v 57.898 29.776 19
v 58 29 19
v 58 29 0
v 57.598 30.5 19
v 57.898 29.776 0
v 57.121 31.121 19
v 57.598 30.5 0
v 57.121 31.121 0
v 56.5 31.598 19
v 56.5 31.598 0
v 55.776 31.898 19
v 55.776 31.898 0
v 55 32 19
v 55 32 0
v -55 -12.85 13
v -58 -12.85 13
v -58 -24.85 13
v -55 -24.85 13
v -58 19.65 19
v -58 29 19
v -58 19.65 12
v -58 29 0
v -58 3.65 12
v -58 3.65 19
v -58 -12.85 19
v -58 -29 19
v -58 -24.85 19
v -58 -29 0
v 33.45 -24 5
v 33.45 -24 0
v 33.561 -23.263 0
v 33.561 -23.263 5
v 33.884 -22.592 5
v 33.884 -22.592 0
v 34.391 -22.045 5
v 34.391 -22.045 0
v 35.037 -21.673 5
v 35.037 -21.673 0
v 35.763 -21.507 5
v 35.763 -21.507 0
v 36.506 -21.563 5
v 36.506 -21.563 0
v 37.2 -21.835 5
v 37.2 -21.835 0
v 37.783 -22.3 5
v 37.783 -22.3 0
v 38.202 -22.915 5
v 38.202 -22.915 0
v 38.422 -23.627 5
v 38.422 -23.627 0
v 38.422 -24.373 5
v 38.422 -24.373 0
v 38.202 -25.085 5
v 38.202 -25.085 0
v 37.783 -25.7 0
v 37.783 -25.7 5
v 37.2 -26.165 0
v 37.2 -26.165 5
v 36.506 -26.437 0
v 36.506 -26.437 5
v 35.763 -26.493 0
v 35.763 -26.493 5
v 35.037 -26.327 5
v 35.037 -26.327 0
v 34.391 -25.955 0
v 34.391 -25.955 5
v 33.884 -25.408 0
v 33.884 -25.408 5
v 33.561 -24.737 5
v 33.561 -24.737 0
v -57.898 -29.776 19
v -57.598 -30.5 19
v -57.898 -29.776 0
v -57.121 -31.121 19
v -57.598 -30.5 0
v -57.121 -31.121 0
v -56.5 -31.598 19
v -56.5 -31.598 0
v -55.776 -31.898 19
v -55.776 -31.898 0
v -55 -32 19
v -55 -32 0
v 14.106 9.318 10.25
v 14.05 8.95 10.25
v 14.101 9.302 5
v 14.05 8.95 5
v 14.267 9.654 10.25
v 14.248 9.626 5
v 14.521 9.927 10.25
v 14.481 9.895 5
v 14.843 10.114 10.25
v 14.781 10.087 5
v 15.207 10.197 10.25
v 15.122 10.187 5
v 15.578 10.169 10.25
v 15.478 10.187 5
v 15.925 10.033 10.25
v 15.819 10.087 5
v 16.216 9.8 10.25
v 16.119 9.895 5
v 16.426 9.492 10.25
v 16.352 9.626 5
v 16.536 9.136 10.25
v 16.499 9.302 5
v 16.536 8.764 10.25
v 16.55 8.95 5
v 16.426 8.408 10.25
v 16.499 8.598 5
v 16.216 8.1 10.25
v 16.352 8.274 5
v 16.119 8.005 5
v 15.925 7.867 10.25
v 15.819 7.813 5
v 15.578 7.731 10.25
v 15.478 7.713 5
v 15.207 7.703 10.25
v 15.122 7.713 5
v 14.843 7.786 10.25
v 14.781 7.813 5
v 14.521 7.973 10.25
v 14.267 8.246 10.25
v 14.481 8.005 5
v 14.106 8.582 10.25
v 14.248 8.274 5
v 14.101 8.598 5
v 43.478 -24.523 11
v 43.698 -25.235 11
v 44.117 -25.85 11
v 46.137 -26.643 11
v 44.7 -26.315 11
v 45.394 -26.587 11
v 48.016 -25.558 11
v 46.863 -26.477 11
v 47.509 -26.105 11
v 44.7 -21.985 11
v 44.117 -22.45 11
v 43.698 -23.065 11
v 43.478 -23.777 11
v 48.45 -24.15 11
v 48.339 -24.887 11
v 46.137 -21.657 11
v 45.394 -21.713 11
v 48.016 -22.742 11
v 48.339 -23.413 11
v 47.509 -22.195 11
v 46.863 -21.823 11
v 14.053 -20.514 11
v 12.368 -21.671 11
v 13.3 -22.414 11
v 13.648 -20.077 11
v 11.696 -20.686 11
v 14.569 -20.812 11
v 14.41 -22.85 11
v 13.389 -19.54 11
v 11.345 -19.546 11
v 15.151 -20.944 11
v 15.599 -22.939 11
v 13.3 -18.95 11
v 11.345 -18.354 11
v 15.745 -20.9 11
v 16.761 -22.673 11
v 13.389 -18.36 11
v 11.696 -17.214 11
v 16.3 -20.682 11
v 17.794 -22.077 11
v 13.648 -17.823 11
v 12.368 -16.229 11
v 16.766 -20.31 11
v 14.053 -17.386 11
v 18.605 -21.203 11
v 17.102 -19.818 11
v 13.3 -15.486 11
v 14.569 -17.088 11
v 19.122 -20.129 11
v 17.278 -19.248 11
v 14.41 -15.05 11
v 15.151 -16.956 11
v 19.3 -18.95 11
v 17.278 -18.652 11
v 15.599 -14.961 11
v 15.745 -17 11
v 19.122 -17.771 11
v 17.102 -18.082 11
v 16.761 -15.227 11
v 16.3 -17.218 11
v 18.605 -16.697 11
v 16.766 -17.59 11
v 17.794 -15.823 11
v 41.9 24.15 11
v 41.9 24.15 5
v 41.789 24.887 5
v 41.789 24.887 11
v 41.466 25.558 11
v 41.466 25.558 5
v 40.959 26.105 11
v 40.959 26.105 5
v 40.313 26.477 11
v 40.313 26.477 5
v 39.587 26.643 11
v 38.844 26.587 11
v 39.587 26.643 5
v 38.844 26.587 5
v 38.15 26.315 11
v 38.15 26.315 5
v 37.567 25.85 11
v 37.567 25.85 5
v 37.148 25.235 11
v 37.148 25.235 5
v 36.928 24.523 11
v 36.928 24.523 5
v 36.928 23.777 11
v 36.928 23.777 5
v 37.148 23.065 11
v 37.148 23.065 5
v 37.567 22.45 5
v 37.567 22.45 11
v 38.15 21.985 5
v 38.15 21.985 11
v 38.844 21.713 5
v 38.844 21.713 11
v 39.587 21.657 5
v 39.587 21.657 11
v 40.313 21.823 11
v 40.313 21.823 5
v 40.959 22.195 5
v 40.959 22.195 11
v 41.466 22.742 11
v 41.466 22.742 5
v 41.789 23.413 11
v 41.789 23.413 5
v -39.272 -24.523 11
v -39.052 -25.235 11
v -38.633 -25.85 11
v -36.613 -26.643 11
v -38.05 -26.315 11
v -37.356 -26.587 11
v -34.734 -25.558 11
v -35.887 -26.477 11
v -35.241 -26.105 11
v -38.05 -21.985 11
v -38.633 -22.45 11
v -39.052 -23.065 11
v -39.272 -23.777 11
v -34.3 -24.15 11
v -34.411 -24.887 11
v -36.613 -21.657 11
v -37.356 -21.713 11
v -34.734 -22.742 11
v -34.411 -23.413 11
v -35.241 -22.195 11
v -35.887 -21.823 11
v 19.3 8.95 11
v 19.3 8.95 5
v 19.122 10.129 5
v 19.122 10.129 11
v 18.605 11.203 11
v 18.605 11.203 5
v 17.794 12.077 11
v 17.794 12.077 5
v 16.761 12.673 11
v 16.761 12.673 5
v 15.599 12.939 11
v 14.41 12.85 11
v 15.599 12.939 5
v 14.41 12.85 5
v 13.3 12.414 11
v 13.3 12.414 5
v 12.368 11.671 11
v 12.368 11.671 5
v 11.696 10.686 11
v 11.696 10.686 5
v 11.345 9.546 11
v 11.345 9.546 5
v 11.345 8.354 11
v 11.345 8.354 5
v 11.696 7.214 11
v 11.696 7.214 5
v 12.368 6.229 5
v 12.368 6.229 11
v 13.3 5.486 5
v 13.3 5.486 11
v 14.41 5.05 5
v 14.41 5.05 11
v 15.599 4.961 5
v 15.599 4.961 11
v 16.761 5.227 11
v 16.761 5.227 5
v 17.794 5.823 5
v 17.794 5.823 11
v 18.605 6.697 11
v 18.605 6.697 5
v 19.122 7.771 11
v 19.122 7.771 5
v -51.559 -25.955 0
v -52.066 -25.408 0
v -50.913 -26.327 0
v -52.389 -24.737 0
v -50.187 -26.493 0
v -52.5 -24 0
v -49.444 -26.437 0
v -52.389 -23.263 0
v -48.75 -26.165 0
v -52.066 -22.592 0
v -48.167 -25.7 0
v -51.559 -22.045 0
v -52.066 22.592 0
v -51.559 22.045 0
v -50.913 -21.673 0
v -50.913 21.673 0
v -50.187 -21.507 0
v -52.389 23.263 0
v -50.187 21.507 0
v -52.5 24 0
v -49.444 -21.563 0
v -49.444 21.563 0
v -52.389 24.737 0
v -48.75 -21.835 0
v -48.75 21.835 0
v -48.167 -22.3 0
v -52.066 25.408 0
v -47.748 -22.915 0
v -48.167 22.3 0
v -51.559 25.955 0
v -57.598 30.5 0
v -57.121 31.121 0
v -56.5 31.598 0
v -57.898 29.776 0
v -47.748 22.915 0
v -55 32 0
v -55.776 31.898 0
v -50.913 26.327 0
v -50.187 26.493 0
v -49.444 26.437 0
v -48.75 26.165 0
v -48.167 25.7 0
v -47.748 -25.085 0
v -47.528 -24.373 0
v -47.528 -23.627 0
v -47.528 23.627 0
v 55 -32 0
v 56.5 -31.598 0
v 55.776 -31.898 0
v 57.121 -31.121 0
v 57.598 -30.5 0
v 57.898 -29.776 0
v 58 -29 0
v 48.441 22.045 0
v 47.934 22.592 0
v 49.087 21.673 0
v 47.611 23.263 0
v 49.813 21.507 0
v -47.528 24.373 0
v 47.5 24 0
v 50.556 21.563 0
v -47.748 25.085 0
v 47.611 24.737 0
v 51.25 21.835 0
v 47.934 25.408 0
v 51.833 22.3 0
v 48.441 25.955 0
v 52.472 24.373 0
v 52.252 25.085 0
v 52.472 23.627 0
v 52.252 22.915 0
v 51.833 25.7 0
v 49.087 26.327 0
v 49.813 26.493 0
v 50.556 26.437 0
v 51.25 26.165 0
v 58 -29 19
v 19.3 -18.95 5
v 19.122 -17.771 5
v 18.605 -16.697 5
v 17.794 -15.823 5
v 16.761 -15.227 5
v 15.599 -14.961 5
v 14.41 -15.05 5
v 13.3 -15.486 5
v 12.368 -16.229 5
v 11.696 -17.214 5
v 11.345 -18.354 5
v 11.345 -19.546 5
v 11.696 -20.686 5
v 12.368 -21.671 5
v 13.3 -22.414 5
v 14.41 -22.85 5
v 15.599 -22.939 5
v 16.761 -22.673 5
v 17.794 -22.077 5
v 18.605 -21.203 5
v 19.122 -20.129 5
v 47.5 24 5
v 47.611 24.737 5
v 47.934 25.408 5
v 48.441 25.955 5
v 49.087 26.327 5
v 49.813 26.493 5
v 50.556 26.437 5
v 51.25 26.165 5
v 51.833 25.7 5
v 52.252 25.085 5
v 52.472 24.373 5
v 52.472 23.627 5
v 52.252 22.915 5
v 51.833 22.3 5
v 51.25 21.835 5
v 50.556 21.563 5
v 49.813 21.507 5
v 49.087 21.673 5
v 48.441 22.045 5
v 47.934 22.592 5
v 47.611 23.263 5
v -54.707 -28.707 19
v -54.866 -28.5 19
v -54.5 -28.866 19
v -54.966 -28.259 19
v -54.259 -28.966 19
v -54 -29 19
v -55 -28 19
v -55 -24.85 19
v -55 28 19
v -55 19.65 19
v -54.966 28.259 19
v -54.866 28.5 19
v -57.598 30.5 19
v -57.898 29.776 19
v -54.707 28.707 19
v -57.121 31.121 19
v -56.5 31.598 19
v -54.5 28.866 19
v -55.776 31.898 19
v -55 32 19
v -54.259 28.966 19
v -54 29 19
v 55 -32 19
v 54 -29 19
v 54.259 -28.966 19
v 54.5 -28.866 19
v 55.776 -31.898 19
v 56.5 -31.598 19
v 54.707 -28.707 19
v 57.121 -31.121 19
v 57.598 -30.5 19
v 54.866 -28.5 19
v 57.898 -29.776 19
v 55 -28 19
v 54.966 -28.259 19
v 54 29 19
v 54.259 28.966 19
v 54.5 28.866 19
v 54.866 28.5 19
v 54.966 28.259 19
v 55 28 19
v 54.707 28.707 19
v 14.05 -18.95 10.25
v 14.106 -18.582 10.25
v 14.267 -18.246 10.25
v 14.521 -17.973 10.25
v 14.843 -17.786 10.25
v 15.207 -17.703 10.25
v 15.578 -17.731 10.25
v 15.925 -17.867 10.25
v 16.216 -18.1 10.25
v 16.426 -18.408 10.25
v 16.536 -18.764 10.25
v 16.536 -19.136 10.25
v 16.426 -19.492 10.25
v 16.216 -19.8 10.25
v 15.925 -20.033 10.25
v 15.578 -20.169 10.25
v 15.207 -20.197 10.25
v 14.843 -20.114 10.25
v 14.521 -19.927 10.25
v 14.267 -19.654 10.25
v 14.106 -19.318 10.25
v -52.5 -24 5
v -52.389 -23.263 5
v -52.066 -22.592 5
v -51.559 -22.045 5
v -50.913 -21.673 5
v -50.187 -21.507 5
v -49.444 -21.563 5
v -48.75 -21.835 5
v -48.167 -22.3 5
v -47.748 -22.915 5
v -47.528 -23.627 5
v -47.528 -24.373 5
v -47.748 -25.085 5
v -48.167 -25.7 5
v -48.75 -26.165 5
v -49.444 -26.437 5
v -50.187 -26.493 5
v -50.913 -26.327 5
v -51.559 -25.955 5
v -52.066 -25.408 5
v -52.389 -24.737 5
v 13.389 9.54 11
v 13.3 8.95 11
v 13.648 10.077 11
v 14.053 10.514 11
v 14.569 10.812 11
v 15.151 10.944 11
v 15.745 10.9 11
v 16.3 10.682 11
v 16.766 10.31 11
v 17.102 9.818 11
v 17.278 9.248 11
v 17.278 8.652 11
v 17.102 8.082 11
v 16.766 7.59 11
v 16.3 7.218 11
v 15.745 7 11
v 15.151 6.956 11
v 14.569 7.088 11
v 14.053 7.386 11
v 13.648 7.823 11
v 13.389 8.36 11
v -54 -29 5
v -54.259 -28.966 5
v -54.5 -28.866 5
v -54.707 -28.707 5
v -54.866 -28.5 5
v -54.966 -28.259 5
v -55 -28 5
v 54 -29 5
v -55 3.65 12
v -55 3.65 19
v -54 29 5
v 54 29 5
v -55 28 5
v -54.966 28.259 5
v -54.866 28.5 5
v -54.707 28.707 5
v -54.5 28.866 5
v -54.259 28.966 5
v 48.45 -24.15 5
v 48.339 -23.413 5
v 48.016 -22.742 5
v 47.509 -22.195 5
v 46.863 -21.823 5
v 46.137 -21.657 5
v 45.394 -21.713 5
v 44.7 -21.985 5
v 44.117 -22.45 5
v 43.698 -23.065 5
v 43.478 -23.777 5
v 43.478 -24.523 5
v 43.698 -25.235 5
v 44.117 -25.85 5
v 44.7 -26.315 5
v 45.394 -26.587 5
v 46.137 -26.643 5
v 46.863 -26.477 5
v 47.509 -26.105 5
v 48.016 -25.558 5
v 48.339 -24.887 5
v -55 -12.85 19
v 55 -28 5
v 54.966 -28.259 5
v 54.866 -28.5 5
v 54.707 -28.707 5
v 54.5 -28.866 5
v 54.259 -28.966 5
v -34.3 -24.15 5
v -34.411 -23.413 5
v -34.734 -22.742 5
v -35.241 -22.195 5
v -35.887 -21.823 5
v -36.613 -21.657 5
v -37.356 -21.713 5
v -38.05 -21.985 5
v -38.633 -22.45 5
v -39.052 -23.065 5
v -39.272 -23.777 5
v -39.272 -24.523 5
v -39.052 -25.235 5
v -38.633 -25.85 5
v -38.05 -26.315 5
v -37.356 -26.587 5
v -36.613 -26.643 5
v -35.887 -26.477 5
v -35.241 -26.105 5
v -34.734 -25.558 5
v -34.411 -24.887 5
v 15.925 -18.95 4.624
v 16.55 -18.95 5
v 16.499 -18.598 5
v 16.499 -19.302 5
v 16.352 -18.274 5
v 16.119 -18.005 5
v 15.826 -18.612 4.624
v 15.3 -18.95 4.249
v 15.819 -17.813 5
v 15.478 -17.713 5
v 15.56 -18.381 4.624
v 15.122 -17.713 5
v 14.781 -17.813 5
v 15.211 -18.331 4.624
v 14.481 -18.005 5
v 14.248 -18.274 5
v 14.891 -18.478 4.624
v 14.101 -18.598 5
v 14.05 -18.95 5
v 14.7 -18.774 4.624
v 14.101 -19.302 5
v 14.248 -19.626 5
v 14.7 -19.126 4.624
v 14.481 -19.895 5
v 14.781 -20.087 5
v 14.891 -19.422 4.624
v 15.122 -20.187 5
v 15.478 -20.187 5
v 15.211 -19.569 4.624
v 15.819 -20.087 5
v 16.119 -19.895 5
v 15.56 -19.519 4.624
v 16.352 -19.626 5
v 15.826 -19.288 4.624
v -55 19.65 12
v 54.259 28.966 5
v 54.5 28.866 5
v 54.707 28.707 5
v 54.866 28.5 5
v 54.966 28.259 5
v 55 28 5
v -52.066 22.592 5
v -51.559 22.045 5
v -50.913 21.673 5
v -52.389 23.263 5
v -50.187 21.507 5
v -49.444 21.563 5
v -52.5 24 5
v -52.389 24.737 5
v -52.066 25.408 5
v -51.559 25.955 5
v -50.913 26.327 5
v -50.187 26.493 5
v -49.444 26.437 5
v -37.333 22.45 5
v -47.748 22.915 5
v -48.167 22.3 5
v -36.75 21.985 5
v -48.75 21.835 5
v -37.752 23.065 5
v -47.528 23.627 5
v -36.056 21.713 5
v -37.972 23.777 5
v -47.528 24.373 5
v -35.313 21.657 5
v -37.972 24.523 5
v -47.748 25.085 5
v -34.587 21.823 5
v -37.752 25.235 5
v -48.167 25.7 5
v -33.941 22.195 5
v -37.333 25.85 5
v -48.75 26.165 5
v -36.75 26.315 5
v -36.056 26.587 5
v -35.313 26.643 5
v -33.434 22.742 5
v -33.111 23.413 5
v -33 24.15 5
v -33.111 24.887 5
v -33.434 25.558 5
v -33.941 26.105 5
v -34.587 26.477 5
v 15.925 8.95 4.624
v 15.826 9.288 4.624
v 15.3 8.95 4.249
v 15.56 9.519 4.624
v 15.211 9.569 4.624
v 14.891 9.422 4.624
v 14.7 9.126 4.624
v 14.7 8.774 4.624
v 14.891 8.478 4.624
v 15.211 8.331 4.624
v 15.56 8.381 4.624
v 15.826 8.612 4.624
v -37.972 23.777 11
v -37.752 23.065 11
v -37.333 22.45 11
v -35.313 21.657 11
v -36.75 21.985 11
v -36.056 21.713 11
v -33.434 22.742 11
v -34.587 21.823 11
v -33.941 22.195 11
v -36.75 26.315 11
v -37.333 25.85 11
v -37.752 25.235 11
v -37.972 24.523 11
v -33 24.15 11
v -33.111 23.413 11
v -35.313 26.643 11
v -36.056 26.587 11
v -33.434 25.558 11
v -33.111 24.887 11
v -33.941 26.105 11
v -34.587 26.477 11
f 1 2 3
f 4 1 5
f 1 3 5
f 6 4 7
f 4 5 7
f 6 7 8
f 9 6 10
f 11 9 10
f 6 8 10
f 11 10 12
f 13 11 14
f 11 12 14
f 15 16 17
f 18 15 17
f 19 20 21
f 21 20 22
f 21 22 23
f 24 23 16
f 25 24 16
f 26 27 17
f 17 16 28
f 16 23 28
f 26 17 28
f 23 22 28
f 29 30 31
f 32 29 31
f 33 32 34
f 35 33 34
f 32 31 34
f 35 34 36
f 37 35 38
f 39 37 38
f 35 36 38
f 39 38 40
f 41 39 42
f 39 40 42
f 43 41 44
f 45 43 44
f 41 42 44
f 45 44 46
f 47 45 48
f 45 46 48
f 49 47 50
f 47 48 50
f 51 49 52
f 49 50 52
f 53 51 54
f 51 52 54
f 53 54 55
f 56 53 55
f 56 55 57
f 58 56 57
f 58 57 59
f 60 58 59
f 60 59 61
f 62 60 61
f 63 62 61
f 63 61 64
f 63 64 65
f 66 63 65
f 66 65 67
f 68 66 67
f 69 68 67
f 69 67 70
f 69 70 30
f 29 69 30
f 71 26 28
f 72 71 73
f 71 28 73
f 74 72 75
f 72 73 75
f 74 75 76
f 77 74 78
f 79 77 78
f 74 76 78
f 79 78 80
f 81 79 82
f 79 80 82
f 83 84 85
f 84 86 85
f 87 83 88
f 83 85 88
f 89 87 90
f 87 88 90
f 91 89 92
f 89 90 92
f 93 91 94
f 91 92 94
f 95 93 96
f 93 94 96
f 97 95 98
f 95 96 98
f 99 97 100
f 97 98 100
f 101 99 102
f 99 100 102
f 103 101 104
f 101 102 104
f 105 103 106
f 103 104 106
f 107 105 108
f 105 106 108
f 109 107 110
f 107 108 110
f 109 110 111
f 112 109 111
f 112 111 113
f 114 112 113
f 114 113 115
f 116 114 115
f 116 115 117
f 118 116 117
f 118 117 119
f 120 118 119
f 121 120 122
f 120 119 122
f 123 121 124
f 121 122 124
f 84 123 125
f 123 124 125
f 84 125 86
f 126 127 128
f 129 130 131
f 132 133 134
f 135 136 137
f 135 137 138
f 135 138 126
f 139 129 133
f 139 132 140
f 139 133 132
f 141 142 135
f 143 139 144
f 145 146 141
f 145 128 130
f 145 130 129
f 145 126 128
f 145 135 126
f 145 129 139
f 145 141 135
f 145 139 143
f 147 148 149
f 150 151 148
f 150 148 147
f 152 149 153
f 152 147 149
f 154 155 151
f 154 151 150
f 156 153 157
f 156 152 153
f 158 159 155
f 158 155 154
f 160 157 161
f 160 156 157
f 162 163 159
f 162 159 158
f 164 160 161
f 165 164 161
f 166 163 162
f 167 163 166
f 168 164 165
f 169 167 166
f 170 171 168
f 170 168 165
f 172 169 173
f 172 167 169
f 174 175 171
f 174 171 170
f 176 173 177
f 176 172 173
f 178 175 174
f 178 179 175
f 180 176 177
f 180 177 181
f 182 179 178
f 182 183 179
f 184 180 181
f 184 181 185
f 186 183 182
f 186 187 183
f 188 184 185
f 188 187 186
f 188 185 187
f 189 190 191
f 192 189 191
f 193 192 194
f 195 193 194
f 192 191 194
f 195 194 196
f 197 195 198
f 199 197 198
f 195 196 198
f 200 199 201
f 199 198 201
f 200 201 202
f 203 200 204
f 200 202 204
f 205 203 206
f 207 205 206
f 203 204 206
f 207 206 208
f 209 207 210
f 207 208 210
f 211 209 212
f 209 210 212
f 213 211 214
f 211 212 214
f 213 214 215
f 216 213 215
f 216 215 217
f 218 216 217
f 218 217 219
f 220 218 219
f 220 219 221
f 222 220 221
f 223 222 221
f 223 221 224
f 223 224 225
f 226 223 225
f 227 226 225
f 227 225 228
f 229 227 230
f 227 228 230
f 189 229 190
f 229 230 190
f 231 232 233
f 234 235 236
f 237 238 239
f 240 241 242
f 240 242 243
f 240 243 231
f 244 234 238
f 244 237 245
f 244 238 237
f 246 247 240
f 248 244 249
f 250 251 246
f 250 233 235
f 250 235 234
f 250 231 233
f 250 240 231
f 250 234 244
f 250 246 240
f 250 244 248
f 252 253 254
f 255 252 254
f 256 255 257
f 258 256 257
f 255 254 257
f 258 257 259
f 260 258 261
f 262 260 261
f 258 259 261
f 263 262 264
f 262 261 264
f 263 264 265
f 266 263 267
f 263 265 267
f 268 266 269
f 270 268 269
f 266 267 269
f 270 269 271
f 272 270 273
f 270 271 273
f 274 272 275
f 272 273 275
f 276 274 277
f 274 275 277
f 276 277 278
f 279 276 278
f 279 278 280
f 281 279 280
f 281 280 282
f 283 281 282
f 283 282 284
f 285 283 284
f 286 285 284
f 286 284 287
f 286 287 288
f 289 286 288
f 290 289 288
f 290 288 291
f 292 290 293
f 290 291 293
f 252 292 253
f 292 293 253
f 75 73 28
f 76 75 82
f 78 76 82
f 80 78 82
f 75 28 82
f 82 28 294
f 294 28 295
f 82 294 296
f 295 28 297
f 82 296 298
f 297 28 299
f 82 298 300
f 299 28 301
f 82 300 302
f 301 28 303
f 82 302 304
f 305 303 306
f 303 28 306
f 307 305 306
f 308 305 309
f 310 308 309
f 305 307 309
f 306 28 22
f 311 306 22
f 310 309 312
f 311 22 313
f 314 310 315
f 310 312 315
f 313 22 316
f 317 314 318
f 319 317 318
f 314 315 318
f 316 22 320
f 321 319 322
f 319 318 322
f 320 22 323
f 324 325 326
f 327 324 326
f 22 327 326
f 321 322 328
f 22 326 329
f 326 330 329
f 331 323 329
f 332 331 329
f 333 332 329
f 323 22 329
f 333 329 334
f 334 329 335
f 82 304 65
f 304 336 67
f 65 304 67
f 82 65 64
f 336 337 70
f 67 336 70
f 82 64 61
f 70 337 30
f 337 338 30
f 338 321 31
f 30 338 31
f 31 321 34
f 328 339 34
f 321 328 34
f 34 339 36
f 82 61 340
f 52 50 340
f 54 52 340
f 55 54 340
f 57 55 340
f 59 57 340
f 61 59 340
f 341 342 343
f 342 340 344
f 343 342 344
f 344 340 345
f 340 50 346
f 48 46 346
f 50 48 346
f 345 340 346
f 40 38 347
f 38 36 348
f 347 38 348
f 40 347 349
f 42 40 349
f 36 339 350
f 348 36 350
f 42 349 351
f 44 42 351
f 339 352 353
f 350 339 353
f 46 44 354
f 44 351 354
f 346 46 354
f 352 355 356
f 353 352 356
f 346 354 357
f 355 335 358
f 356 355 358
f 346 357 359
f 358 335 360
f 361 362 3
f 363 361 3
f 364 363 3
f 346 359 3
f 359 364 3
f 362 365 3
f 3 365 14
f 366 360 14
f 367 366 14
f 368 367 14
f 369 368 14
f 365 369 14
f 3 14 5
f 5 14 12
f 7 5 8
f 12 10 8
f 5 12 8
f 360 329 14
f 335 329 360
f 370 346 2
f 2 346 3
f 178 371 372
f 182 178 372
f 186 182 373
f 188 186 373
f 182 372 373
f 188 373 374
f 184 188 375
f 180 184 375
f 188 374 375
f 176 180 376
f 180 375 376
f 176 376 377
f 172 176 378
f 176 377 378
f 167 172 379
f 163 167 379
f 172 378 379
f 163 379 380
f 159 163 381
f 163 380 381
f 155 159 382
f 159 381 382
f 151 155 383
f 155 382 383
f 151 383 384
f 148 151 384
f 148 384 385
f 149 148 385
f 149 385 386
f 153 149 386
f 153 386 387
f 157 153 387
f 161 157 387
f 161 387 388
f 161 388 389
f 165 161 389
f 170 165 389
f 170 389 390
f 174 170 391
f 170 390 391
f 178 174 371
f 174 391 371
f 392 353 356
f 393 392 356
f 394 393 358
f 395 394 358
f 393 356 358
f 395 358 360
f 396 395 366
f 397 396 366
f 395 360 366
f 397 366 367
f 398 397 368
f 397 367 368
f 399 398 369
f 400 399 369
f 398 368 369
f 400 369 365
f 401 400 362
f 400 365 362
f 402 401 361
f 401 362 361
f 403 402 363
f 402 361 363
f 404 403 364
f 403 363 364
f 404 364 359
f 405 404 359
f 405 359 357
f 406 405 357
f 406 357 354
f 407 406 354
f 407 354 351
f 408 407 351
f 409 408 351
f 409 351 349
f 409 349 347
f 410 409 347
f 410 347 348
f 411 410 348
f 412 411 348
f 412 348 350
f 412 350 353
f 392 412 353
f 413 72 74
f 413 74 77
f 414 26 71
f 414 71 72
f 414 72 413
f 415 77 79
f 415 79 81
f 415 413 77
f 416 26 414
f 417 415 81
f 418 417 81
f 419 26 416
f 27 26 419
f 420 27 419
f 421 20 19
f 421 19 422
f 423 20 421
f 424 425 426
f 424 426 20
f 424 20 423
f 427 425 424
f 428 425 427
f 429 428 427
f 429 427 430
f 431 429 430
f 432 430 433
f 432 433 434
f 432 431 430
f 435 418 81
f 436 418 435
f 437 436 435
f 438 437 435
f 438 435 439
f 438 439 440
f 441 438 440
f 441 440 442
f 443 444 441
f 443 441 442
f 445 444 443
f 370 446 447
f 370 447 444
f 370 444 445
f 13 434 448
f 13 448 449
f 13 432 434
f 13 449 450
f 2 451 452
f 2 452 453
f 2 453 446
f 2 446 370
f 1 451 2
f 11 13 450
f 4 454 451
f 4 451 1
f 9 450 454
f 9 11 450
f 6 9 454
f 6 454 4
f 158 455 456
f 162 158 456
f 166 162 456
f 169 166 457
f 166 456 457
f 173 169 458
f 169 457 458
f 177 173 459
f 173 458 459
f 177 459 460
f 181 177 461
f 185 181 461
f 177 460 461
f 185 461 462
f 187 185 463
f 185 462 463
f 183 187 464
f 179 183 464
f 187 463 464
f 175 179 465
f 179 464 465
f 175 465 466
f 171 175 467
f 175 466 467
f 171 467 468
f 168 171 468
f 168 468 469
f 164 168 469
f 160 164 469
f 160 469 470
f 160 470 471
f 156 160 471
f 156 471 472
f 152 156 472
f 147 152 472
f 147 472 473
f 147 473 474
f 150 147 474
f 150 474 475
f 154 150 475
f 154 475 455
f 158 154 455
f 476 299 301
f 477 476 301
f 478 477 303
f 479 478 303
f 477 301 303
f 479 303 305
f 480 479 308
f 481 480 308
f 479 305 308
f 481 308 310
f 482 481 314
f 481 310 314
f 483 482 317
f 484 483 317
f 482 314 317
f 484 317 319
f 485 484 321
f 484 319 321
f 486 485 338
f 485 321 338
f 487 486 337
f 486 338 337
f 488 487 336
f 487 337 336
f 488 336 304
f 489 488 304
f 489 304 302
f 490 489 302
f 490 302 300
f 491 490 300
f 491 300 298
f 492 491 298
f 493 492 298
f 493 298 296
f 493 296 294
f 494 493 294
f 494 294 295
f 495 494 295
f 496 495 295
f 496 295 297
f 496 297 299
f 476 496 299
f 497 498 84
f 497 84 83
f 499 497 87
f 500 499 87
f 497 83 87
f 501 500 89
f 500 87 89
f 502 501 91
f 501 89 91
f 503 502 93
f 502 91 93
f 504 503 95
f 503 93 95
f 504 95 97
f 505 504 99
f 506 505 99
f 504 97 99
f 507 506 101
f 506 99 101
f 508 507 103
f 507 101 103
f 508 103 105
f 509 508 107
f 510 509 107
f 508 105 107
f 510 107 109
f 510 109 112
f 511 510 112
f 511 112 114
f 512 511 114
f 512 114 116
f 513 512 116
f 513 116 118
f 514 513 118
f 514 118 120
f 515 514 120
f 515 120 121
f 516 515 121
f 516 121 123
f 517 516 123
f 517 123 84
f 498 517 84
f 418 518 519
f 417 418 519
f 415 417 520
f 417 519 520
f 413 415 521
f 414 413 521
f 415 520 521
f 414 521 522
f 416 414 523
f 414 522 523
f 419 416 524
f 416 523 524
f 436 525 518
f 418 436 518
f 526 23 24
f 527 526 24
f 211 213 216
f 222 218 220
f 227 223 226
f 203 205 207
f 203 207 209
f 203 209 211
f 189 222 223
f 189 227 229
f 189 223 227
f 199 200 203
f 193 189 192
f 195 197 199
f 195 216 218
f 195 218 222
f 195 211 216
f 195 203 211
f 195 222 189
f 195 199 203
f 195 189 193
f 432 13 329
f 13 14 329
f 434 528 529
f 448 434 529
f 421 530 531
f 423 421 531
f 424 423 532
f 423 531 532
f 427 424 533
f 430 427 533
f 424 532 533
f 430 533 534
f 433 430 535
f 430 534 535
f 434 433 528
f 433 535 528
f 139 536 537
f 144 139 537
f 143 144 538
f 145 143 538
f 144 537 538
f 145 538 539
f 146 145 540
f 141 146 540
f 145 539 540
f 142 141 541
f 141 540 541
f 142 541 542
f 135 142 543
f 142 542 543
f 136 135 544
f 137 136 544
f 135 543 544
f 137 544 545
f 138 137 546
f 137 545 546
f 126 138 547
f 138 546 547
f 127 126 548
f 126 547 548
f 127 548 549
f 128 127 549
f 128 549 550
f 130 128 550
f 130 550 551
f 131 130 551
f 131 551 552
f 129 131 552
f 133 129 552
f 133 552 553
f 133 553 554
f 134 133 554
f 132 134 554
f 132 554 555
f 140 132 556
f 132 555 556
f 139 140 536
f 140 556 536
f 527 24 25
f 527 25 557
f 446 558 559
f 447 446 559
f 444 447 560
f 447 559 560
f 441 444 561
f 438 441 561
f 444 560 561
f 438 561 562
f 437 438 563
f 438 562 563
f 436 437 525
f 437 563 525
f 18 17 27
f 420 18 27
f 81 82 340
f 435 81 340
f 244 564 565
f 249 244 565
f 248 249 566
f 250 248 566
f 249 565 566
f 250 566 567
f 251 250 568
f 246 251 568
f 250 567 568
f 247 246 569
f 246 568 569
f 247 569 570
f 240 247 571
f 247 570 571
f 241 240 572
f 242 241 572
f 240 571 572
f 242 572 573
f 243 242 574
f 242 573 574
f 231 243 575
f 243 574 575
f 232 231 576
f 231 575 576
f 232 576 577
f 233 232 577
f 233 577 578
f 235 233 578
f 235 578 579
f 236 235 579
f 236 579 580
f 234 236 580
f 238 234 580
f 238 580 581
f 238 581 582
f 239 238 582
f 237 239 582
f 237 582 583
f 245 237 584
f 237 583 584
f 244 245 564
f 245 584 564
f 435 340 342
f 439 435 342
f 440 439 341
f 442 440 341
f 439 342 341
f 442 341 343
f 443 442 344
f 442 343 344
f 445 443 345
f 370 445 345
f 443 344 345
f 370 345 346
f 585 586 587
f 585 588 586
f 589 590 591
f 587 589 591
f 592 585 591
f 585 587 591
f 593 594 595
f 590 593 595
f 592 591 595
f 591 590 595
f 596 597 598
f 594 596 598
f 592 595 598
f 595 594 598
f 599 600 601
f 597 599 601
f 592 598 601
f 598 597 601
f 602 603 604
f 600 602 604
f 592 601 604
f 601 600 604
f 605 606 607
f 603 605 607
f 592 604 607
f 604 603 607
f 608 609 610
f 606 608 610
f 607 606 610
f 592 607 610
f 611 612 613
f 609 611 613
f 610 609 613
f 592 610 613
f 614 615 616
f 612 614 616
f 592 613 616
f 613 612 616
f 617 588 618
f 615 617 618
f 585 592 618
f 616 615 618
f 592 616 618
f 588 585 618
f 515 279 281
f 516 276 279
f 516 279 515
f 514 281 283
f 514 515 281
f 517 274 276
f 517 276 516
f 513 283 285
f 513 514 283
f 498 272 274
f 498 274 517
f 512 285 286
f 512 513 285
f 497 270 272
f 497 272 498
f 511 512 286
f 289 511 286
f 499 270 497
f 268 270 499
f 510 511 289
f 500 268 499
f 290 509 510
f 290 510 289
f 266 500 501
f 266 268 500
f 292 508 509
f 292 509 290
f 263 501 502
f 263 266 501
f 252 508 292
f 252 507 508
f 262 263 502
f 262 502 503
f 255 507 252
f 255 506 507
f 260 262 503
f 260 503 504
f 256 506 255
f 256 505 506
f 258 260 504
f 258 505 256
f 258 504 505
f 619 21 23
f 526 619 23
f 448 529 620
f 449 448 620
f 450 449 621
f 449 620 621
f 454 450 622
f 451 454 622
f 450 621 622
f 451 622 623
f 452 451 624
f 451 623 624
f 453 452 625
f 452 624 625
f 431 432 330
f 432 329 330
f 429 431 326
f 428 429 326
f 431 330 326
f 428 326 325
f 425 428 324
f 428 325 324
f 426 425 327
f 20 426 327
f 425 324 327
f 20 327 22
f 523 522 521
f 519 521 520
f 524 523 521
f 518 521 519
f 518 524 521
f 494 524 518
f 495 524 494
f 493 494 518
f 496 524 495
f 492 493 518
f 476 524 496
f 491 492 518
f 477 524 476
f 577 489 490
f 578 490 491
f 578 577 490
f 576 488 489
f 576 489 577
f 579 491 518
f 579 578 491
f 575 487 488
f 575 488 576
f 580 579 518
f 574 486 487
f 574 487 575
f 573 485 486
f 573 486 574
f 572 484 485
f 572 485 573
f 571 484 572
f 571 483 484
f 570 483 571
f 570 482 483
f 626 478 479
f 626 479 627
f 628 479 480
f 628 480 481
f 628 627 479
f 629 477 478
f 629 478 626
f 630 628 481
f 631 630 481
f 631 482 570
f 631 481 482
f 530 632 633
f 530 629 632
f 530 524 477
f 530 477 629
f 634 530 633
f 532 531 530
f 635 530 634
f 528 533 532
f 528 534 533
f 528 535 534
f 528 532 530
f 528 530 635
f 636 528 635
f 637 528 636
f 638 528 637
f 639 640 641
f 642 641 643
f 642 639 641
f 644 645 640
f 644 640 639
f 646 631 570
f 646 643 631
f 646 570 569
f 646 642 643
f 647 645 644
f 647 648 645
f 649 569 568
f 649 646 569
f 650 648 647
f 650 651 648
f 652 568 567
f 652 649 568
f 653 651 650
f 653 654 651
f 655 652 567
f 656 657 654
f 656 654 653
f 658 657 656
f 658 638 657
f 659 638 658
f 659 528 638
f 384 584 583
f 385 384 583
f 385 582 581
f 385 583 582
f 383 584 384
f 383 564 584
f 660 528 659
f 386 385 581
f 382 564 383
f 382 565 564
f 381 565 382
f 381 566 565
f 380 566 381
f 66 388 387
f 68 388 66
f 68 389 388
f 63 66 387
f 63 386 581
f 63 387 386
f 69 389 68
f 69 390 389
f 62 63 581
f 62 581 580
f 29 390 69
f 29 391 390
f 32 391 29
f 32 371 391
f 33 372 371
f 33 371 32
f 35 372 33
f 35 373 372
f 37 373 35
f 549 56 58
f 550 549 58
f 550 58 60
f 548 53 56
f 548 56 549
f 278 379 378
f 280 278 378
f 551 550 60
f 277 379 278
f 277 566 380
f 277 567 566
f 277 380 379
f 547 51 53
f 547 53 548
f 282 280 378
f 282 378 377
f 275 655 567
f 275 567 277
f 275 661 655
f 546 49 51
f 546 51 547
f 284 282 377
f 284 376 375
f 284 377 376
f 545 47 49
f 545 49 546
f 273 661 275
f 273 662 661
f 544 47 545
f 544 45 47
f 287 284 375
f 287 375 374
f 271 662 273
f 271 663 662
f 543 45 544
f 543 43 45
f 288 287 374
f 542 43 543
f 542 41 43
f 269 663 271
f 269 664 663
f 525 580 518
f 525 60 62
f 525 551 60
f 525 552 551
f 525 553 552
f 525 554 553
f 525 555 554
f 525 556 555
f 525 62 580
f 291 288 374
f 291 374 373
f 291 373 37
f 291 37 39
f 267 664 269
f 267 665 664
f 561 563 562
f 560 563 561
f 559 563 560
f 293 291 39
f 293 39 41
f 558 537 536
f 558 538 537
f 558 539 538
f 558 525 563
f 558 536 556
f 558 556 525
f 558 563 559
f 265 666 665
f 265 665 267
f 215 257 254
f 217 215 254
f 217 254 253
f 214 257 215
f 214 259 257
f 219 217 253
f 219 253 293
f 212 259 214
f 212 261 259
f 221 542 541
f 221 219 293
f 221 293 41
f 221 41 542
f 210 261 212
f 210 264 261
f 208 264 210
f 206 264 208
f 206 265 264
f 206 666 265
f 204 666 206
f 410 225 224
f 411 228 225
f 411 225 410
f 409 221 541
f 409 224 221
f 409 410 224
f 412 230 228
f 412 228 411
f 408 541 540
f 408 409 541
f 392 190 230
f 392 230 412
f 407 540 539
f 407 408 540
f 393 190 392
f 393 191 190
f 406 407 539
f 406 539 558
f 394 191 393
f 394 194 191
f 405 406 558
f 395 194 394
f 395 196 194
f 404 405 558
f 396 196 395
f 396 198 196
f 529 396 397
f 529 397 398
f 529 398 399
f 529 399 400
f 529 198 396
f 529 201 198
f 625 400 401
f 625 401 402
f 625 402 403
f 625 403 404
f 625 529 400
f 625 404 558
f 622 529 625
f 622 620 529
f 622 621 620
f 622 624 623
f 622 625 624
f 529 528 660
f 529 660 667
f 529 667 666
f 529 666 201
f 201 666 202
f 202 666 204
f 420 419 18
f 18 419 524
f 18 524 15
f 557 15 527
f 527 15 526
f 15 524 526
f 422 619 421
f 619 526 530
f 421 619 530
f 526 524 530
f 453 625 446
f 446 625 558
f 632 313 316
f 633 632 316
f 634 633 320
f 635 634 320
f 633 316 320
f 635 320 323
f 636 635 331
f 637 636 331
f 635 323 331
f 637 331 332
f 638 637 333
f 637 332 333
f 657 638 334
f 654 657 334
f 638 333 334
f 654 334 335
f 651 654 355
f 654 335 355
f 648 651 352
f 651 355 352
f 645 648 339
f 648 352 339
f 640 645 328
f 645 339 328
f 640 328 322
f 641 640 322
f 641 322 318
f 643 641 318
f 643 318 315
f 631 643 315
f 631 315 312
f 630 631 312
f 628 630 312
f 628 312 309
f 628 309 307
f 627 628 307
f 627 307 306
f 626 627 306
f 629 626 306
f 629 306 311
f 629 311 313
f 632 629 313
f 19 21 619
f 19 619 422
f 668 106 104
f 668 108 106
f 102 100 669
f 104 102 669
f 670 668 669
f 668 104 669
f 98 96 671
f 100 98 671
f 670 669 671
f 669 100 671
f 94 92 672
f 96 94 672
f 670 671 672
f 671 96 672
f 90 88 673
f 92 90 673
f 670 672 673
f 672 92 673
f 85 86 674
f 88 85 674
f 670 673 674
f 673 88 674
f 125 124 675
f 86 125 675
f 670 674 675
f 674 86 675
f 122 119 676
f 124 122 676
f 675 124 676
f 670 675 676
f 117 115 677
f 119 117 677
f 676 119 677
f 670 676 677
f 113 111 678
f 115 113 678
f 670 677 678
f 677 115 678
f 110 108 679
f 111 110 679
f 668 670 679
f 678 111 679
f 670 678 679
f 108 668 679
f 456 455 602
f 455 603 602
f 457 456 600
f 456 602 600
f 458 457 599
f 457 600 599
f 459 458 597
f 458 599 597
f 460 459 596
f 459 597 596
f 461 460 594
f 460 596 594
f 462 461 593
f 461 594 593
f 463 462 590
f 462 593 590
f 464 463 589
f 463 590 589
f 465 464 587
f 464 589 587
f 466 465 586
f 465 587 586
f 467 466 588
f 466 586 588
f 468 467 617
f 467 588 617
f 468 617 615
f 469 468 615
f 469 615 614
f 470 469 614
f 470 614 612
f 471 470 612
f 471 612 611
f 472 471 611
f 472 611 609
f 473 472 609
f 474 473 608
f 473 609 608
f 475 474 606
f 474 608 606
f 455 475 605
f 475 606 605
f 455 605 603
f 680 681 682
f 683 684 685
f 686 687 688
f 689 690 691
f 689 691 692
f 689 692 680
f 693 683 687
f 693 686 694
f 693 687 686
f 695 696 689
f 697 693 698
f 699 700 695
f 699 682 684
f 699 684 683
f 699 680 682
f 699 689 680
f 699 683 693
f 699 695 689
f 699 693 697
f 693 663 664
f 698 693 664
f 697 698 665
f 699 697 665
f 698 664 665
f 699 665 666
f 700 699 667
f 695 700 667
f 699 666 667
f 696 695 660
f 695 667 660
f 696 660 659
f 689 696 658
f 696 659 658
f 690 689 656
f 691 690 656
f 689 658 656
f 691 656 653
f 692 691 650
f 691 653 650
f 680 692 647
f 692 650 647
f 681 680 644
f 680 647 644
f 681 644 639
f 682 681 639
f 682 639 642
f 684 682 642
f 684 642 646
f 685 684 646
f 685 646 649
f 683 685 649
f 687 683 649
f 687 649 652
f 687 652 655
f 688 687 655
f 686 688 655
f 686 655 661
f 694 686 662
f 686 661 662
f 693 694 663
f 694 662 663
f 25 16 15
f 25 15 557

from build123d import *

# Parameters (mm, degrees)
F2_DEPTH       = 5
F4_DEPTH       = 14
F3_R           = 2.5
F3_R_2         = 4
F5_DEPTH       = 6
F7_D           = 2.5
F7_DEPTH       = 6
F7_CSINK_D     = 4
F7_CSINK_ANGLE = 90
F7_TIP         = 0.7510757738
F8_D           = 5
F9_W           = 16
F9_H           = 7
F9_W_2         = 12
F9_H_2         = 6
F10_DEPTH      = 3


# Not quite as in the source:
# - a feature names something its author has since deleted; it is built from what else it names


with BuildPart() as f2:
    # F1 (on Top) → F2 (new body)
    with BuildSketch(Plane.XY):
        with BuildLine():
            ThreePointArc((58, 29), (57.1213203436, 31.1213203436), (55, 32))
            Line((55, 32), (-55, 32))
            ThreePointArc((-55, 32), (-57.1213203436, 31.1213203436), (-58, 29))
            Line((-58, 29), (-58, -29))
            ThreePointArc((-58, -29), (-57.1213203436, -31.1213203436), (-55, -32))
            Line((-55, -32), (55, -32))
            ThreePointArc((55, -32), (57.1213203436, -31.1213203436), (58, -29))
            Line((58, -29), (58, 29))
        make_face()
        with BuildLine():
            ThreePointArc((55, -28), (54.7071067812, -28.7071067812), (54, -29))
            Line((54, -29), (-54, -29))
            ThreePointArc((-54, -29), (-54.7071067812, -28.7071067812), (-55, -28))
            Line((-55, -28), (-55, 28))
            ThreePointArc((-55, 28), (-54.7071067812, 28.7071067812), (-54, 29))
            Line((-54, 29), (54, 29))
            ThreePointArc((54, 29), (54.7071067812, 28.7071067812), (55, 28))
            Line((55, 28), (55, -28))
        make_face(mode=Mode.SUBTRACT)
        with BuildLine():
            Line((-54, -29), (54, -29))
            ThreePointArc((54, -29), (54.7071067812, -28.7071067812), (55, -28))
            Line((55, -28), (55, 28))
            ThreePointArc((55, 28), (54.7071067812, 28.7071067812), (54, 29))
            Line((54, 29), (-54, 29))
            ThreePointArc((-54, 29), (-54.7071067812, 28.7071067812), (-55, 28))
            Line((-55, 28), (-55, -28))
            ThreePointArc((-55, -28), (-54.7071067812, -28.7071067812), (-54, -29))
        make_face()
    extrude(amount=F2_DEPTH)

    # F3 (on face) → F4 (join)
    with BuildSketch(Plane.XY.offset(5)):
        with BuildLine():
            ThreePointArc((58, 29), (57.1213203436, 31.1213203436), (55, 32))
            Line((55, 32), (-55, 32))
            ThreePointArc((-55, 32), (-57.1213203436, 31.1213203436), (-58, 29))
            Line((-58, 29), (-58, -29))
            ThreePointArc((-58, -29), (-57.1213203436, -31.1213203436), (-55, -32))
            Line((-55, -32), (55, -32))
            ThreePointArc((55, -32), (57.1213203436, -31.1213203436), (58, -29))
            Line((58, -29), (58, 29))
        make_face()
        with BuildLine():
            ThreePointArc((55, -28), (54.7071067812, -28.7071067812), (54, -29))
            Line((54, -29), (-54, -29))
            ThreePointArc((-54, -29), (-54.7071067812, -28.7071067812), (-55, -28))
            Line((-55, -28), (-55, 28))
            ThreePointArc((-55, 28), (-54.7071067812, 28.7071067812), (-54, 29))
            Line((-54, 29), (54, 29))
            ThreePointArc((54, 29), (54.7071067812, 28.7071067812), (55, 28))
            Line((55, 28), (55, -28))
        make_face(mode=Mode.SUBTRACT)
    extrude(amount=F4_DEPTH)

    # F3 (on face) → F5 (join)
    with BuildSketch(Plane.XY.offset(5)):
        with BuildLine():
            ThreePointArc((58, 29), (57.1213203436, 31.1213203436), (55, 32))
            Line((55, 32), (-55, 32))
            ThreePointArc((-55, 32), (-57.1213203436, 31.1213203436), (-58, 29))
            Line((-58, 29), (-58, -29))
            ThreePointArc((-58, -29), (-57.1213203436, -31.1213203436), (-55, -32))
            Line((-55, -32), (55, -32))
            ThreePointArc((55, -32), (57.1213203436, -31.1213203436), (58, -29))
            Line((58, -29), (58, 29))
        make_face()
        with BuildLine():
            ThreePointArc((55, -28), (54.7071067812, -28.7071067812), (54, -29))
            Line((54, -29), (-54, -29))
            ThreePointArc((-54, -29), (-54.7071067812, -28.7071067812), (-55, -28))
            Line((-55, -28), (-55, 28))
            ThreePointArc((-55, 28), (-54.7071067812, 28.7071067812), (-54, 29))
            Line((-54, 29), (54, 29))
            ThreePointArc((54, 29), (54.7071067812, 28.7071067812), (55, 28))
            Line((55, 28), (55, -28))
        make_face(mode=Mode.SUBTRACT)
        with Locations((-35.5, 24.15)):
            Circle(F3_R)
        with Locations((-36.8, -24.15)):
            Circle(F3_R)
        with Locations((15.3, 8.95)):
            Circle(F3_R_2)
        with Locations((15.3, -18.95)):
            Circle(F3_R_2)
        with Locations((45.95, -24.15)):
            Circle(F3_R)
        with Locations((39.4, 24.15)):
            Circle(F3_R)
    extrude(amount=F5_DEPTH)

    # F7
    with Locations(Plane.XY.offset(11)):
        with Locations((15.3, 8.95), (15.3, -18.95)):
            CounterSinkHole(F7_D / 2, F7_CSINK_D / 2, depth=F7_DEPTH, counter_sink_angle=F7_CSINK_ANGLE)
            with Locations((0, 0, -(F7_DEPTH + F7_TIP / 2))):  # 118° drill point
                Cone(0, F7_D / 2, F7_TIP, mode=Mode.SUBTRACT)

    # F8 (through all)
    with Locations(Plane.XY.offset(5)):
        with Locations((-50, 24), (50, 24), (35.95, -24), (-50, -24)):
            Hole(F8_D / 2)

    # F9 (on face) → F10 (cut, through all)
    with BuildSketch(Plane(origin=(-58, 0, 0), x_dir=(0, -1, 0), z_dir=(-1, 0, 0))):
        with Locations((-11.65, 15.5)):
            Rectangle(F9_W, F9_H)
        with Locations((18.85, 16)):
            Rectangle(F9_W_2, F9_H_2)
    extrude(amount=-F10_DEPTH, mode=Mode.SUBTRACT)


solid = f2.part
